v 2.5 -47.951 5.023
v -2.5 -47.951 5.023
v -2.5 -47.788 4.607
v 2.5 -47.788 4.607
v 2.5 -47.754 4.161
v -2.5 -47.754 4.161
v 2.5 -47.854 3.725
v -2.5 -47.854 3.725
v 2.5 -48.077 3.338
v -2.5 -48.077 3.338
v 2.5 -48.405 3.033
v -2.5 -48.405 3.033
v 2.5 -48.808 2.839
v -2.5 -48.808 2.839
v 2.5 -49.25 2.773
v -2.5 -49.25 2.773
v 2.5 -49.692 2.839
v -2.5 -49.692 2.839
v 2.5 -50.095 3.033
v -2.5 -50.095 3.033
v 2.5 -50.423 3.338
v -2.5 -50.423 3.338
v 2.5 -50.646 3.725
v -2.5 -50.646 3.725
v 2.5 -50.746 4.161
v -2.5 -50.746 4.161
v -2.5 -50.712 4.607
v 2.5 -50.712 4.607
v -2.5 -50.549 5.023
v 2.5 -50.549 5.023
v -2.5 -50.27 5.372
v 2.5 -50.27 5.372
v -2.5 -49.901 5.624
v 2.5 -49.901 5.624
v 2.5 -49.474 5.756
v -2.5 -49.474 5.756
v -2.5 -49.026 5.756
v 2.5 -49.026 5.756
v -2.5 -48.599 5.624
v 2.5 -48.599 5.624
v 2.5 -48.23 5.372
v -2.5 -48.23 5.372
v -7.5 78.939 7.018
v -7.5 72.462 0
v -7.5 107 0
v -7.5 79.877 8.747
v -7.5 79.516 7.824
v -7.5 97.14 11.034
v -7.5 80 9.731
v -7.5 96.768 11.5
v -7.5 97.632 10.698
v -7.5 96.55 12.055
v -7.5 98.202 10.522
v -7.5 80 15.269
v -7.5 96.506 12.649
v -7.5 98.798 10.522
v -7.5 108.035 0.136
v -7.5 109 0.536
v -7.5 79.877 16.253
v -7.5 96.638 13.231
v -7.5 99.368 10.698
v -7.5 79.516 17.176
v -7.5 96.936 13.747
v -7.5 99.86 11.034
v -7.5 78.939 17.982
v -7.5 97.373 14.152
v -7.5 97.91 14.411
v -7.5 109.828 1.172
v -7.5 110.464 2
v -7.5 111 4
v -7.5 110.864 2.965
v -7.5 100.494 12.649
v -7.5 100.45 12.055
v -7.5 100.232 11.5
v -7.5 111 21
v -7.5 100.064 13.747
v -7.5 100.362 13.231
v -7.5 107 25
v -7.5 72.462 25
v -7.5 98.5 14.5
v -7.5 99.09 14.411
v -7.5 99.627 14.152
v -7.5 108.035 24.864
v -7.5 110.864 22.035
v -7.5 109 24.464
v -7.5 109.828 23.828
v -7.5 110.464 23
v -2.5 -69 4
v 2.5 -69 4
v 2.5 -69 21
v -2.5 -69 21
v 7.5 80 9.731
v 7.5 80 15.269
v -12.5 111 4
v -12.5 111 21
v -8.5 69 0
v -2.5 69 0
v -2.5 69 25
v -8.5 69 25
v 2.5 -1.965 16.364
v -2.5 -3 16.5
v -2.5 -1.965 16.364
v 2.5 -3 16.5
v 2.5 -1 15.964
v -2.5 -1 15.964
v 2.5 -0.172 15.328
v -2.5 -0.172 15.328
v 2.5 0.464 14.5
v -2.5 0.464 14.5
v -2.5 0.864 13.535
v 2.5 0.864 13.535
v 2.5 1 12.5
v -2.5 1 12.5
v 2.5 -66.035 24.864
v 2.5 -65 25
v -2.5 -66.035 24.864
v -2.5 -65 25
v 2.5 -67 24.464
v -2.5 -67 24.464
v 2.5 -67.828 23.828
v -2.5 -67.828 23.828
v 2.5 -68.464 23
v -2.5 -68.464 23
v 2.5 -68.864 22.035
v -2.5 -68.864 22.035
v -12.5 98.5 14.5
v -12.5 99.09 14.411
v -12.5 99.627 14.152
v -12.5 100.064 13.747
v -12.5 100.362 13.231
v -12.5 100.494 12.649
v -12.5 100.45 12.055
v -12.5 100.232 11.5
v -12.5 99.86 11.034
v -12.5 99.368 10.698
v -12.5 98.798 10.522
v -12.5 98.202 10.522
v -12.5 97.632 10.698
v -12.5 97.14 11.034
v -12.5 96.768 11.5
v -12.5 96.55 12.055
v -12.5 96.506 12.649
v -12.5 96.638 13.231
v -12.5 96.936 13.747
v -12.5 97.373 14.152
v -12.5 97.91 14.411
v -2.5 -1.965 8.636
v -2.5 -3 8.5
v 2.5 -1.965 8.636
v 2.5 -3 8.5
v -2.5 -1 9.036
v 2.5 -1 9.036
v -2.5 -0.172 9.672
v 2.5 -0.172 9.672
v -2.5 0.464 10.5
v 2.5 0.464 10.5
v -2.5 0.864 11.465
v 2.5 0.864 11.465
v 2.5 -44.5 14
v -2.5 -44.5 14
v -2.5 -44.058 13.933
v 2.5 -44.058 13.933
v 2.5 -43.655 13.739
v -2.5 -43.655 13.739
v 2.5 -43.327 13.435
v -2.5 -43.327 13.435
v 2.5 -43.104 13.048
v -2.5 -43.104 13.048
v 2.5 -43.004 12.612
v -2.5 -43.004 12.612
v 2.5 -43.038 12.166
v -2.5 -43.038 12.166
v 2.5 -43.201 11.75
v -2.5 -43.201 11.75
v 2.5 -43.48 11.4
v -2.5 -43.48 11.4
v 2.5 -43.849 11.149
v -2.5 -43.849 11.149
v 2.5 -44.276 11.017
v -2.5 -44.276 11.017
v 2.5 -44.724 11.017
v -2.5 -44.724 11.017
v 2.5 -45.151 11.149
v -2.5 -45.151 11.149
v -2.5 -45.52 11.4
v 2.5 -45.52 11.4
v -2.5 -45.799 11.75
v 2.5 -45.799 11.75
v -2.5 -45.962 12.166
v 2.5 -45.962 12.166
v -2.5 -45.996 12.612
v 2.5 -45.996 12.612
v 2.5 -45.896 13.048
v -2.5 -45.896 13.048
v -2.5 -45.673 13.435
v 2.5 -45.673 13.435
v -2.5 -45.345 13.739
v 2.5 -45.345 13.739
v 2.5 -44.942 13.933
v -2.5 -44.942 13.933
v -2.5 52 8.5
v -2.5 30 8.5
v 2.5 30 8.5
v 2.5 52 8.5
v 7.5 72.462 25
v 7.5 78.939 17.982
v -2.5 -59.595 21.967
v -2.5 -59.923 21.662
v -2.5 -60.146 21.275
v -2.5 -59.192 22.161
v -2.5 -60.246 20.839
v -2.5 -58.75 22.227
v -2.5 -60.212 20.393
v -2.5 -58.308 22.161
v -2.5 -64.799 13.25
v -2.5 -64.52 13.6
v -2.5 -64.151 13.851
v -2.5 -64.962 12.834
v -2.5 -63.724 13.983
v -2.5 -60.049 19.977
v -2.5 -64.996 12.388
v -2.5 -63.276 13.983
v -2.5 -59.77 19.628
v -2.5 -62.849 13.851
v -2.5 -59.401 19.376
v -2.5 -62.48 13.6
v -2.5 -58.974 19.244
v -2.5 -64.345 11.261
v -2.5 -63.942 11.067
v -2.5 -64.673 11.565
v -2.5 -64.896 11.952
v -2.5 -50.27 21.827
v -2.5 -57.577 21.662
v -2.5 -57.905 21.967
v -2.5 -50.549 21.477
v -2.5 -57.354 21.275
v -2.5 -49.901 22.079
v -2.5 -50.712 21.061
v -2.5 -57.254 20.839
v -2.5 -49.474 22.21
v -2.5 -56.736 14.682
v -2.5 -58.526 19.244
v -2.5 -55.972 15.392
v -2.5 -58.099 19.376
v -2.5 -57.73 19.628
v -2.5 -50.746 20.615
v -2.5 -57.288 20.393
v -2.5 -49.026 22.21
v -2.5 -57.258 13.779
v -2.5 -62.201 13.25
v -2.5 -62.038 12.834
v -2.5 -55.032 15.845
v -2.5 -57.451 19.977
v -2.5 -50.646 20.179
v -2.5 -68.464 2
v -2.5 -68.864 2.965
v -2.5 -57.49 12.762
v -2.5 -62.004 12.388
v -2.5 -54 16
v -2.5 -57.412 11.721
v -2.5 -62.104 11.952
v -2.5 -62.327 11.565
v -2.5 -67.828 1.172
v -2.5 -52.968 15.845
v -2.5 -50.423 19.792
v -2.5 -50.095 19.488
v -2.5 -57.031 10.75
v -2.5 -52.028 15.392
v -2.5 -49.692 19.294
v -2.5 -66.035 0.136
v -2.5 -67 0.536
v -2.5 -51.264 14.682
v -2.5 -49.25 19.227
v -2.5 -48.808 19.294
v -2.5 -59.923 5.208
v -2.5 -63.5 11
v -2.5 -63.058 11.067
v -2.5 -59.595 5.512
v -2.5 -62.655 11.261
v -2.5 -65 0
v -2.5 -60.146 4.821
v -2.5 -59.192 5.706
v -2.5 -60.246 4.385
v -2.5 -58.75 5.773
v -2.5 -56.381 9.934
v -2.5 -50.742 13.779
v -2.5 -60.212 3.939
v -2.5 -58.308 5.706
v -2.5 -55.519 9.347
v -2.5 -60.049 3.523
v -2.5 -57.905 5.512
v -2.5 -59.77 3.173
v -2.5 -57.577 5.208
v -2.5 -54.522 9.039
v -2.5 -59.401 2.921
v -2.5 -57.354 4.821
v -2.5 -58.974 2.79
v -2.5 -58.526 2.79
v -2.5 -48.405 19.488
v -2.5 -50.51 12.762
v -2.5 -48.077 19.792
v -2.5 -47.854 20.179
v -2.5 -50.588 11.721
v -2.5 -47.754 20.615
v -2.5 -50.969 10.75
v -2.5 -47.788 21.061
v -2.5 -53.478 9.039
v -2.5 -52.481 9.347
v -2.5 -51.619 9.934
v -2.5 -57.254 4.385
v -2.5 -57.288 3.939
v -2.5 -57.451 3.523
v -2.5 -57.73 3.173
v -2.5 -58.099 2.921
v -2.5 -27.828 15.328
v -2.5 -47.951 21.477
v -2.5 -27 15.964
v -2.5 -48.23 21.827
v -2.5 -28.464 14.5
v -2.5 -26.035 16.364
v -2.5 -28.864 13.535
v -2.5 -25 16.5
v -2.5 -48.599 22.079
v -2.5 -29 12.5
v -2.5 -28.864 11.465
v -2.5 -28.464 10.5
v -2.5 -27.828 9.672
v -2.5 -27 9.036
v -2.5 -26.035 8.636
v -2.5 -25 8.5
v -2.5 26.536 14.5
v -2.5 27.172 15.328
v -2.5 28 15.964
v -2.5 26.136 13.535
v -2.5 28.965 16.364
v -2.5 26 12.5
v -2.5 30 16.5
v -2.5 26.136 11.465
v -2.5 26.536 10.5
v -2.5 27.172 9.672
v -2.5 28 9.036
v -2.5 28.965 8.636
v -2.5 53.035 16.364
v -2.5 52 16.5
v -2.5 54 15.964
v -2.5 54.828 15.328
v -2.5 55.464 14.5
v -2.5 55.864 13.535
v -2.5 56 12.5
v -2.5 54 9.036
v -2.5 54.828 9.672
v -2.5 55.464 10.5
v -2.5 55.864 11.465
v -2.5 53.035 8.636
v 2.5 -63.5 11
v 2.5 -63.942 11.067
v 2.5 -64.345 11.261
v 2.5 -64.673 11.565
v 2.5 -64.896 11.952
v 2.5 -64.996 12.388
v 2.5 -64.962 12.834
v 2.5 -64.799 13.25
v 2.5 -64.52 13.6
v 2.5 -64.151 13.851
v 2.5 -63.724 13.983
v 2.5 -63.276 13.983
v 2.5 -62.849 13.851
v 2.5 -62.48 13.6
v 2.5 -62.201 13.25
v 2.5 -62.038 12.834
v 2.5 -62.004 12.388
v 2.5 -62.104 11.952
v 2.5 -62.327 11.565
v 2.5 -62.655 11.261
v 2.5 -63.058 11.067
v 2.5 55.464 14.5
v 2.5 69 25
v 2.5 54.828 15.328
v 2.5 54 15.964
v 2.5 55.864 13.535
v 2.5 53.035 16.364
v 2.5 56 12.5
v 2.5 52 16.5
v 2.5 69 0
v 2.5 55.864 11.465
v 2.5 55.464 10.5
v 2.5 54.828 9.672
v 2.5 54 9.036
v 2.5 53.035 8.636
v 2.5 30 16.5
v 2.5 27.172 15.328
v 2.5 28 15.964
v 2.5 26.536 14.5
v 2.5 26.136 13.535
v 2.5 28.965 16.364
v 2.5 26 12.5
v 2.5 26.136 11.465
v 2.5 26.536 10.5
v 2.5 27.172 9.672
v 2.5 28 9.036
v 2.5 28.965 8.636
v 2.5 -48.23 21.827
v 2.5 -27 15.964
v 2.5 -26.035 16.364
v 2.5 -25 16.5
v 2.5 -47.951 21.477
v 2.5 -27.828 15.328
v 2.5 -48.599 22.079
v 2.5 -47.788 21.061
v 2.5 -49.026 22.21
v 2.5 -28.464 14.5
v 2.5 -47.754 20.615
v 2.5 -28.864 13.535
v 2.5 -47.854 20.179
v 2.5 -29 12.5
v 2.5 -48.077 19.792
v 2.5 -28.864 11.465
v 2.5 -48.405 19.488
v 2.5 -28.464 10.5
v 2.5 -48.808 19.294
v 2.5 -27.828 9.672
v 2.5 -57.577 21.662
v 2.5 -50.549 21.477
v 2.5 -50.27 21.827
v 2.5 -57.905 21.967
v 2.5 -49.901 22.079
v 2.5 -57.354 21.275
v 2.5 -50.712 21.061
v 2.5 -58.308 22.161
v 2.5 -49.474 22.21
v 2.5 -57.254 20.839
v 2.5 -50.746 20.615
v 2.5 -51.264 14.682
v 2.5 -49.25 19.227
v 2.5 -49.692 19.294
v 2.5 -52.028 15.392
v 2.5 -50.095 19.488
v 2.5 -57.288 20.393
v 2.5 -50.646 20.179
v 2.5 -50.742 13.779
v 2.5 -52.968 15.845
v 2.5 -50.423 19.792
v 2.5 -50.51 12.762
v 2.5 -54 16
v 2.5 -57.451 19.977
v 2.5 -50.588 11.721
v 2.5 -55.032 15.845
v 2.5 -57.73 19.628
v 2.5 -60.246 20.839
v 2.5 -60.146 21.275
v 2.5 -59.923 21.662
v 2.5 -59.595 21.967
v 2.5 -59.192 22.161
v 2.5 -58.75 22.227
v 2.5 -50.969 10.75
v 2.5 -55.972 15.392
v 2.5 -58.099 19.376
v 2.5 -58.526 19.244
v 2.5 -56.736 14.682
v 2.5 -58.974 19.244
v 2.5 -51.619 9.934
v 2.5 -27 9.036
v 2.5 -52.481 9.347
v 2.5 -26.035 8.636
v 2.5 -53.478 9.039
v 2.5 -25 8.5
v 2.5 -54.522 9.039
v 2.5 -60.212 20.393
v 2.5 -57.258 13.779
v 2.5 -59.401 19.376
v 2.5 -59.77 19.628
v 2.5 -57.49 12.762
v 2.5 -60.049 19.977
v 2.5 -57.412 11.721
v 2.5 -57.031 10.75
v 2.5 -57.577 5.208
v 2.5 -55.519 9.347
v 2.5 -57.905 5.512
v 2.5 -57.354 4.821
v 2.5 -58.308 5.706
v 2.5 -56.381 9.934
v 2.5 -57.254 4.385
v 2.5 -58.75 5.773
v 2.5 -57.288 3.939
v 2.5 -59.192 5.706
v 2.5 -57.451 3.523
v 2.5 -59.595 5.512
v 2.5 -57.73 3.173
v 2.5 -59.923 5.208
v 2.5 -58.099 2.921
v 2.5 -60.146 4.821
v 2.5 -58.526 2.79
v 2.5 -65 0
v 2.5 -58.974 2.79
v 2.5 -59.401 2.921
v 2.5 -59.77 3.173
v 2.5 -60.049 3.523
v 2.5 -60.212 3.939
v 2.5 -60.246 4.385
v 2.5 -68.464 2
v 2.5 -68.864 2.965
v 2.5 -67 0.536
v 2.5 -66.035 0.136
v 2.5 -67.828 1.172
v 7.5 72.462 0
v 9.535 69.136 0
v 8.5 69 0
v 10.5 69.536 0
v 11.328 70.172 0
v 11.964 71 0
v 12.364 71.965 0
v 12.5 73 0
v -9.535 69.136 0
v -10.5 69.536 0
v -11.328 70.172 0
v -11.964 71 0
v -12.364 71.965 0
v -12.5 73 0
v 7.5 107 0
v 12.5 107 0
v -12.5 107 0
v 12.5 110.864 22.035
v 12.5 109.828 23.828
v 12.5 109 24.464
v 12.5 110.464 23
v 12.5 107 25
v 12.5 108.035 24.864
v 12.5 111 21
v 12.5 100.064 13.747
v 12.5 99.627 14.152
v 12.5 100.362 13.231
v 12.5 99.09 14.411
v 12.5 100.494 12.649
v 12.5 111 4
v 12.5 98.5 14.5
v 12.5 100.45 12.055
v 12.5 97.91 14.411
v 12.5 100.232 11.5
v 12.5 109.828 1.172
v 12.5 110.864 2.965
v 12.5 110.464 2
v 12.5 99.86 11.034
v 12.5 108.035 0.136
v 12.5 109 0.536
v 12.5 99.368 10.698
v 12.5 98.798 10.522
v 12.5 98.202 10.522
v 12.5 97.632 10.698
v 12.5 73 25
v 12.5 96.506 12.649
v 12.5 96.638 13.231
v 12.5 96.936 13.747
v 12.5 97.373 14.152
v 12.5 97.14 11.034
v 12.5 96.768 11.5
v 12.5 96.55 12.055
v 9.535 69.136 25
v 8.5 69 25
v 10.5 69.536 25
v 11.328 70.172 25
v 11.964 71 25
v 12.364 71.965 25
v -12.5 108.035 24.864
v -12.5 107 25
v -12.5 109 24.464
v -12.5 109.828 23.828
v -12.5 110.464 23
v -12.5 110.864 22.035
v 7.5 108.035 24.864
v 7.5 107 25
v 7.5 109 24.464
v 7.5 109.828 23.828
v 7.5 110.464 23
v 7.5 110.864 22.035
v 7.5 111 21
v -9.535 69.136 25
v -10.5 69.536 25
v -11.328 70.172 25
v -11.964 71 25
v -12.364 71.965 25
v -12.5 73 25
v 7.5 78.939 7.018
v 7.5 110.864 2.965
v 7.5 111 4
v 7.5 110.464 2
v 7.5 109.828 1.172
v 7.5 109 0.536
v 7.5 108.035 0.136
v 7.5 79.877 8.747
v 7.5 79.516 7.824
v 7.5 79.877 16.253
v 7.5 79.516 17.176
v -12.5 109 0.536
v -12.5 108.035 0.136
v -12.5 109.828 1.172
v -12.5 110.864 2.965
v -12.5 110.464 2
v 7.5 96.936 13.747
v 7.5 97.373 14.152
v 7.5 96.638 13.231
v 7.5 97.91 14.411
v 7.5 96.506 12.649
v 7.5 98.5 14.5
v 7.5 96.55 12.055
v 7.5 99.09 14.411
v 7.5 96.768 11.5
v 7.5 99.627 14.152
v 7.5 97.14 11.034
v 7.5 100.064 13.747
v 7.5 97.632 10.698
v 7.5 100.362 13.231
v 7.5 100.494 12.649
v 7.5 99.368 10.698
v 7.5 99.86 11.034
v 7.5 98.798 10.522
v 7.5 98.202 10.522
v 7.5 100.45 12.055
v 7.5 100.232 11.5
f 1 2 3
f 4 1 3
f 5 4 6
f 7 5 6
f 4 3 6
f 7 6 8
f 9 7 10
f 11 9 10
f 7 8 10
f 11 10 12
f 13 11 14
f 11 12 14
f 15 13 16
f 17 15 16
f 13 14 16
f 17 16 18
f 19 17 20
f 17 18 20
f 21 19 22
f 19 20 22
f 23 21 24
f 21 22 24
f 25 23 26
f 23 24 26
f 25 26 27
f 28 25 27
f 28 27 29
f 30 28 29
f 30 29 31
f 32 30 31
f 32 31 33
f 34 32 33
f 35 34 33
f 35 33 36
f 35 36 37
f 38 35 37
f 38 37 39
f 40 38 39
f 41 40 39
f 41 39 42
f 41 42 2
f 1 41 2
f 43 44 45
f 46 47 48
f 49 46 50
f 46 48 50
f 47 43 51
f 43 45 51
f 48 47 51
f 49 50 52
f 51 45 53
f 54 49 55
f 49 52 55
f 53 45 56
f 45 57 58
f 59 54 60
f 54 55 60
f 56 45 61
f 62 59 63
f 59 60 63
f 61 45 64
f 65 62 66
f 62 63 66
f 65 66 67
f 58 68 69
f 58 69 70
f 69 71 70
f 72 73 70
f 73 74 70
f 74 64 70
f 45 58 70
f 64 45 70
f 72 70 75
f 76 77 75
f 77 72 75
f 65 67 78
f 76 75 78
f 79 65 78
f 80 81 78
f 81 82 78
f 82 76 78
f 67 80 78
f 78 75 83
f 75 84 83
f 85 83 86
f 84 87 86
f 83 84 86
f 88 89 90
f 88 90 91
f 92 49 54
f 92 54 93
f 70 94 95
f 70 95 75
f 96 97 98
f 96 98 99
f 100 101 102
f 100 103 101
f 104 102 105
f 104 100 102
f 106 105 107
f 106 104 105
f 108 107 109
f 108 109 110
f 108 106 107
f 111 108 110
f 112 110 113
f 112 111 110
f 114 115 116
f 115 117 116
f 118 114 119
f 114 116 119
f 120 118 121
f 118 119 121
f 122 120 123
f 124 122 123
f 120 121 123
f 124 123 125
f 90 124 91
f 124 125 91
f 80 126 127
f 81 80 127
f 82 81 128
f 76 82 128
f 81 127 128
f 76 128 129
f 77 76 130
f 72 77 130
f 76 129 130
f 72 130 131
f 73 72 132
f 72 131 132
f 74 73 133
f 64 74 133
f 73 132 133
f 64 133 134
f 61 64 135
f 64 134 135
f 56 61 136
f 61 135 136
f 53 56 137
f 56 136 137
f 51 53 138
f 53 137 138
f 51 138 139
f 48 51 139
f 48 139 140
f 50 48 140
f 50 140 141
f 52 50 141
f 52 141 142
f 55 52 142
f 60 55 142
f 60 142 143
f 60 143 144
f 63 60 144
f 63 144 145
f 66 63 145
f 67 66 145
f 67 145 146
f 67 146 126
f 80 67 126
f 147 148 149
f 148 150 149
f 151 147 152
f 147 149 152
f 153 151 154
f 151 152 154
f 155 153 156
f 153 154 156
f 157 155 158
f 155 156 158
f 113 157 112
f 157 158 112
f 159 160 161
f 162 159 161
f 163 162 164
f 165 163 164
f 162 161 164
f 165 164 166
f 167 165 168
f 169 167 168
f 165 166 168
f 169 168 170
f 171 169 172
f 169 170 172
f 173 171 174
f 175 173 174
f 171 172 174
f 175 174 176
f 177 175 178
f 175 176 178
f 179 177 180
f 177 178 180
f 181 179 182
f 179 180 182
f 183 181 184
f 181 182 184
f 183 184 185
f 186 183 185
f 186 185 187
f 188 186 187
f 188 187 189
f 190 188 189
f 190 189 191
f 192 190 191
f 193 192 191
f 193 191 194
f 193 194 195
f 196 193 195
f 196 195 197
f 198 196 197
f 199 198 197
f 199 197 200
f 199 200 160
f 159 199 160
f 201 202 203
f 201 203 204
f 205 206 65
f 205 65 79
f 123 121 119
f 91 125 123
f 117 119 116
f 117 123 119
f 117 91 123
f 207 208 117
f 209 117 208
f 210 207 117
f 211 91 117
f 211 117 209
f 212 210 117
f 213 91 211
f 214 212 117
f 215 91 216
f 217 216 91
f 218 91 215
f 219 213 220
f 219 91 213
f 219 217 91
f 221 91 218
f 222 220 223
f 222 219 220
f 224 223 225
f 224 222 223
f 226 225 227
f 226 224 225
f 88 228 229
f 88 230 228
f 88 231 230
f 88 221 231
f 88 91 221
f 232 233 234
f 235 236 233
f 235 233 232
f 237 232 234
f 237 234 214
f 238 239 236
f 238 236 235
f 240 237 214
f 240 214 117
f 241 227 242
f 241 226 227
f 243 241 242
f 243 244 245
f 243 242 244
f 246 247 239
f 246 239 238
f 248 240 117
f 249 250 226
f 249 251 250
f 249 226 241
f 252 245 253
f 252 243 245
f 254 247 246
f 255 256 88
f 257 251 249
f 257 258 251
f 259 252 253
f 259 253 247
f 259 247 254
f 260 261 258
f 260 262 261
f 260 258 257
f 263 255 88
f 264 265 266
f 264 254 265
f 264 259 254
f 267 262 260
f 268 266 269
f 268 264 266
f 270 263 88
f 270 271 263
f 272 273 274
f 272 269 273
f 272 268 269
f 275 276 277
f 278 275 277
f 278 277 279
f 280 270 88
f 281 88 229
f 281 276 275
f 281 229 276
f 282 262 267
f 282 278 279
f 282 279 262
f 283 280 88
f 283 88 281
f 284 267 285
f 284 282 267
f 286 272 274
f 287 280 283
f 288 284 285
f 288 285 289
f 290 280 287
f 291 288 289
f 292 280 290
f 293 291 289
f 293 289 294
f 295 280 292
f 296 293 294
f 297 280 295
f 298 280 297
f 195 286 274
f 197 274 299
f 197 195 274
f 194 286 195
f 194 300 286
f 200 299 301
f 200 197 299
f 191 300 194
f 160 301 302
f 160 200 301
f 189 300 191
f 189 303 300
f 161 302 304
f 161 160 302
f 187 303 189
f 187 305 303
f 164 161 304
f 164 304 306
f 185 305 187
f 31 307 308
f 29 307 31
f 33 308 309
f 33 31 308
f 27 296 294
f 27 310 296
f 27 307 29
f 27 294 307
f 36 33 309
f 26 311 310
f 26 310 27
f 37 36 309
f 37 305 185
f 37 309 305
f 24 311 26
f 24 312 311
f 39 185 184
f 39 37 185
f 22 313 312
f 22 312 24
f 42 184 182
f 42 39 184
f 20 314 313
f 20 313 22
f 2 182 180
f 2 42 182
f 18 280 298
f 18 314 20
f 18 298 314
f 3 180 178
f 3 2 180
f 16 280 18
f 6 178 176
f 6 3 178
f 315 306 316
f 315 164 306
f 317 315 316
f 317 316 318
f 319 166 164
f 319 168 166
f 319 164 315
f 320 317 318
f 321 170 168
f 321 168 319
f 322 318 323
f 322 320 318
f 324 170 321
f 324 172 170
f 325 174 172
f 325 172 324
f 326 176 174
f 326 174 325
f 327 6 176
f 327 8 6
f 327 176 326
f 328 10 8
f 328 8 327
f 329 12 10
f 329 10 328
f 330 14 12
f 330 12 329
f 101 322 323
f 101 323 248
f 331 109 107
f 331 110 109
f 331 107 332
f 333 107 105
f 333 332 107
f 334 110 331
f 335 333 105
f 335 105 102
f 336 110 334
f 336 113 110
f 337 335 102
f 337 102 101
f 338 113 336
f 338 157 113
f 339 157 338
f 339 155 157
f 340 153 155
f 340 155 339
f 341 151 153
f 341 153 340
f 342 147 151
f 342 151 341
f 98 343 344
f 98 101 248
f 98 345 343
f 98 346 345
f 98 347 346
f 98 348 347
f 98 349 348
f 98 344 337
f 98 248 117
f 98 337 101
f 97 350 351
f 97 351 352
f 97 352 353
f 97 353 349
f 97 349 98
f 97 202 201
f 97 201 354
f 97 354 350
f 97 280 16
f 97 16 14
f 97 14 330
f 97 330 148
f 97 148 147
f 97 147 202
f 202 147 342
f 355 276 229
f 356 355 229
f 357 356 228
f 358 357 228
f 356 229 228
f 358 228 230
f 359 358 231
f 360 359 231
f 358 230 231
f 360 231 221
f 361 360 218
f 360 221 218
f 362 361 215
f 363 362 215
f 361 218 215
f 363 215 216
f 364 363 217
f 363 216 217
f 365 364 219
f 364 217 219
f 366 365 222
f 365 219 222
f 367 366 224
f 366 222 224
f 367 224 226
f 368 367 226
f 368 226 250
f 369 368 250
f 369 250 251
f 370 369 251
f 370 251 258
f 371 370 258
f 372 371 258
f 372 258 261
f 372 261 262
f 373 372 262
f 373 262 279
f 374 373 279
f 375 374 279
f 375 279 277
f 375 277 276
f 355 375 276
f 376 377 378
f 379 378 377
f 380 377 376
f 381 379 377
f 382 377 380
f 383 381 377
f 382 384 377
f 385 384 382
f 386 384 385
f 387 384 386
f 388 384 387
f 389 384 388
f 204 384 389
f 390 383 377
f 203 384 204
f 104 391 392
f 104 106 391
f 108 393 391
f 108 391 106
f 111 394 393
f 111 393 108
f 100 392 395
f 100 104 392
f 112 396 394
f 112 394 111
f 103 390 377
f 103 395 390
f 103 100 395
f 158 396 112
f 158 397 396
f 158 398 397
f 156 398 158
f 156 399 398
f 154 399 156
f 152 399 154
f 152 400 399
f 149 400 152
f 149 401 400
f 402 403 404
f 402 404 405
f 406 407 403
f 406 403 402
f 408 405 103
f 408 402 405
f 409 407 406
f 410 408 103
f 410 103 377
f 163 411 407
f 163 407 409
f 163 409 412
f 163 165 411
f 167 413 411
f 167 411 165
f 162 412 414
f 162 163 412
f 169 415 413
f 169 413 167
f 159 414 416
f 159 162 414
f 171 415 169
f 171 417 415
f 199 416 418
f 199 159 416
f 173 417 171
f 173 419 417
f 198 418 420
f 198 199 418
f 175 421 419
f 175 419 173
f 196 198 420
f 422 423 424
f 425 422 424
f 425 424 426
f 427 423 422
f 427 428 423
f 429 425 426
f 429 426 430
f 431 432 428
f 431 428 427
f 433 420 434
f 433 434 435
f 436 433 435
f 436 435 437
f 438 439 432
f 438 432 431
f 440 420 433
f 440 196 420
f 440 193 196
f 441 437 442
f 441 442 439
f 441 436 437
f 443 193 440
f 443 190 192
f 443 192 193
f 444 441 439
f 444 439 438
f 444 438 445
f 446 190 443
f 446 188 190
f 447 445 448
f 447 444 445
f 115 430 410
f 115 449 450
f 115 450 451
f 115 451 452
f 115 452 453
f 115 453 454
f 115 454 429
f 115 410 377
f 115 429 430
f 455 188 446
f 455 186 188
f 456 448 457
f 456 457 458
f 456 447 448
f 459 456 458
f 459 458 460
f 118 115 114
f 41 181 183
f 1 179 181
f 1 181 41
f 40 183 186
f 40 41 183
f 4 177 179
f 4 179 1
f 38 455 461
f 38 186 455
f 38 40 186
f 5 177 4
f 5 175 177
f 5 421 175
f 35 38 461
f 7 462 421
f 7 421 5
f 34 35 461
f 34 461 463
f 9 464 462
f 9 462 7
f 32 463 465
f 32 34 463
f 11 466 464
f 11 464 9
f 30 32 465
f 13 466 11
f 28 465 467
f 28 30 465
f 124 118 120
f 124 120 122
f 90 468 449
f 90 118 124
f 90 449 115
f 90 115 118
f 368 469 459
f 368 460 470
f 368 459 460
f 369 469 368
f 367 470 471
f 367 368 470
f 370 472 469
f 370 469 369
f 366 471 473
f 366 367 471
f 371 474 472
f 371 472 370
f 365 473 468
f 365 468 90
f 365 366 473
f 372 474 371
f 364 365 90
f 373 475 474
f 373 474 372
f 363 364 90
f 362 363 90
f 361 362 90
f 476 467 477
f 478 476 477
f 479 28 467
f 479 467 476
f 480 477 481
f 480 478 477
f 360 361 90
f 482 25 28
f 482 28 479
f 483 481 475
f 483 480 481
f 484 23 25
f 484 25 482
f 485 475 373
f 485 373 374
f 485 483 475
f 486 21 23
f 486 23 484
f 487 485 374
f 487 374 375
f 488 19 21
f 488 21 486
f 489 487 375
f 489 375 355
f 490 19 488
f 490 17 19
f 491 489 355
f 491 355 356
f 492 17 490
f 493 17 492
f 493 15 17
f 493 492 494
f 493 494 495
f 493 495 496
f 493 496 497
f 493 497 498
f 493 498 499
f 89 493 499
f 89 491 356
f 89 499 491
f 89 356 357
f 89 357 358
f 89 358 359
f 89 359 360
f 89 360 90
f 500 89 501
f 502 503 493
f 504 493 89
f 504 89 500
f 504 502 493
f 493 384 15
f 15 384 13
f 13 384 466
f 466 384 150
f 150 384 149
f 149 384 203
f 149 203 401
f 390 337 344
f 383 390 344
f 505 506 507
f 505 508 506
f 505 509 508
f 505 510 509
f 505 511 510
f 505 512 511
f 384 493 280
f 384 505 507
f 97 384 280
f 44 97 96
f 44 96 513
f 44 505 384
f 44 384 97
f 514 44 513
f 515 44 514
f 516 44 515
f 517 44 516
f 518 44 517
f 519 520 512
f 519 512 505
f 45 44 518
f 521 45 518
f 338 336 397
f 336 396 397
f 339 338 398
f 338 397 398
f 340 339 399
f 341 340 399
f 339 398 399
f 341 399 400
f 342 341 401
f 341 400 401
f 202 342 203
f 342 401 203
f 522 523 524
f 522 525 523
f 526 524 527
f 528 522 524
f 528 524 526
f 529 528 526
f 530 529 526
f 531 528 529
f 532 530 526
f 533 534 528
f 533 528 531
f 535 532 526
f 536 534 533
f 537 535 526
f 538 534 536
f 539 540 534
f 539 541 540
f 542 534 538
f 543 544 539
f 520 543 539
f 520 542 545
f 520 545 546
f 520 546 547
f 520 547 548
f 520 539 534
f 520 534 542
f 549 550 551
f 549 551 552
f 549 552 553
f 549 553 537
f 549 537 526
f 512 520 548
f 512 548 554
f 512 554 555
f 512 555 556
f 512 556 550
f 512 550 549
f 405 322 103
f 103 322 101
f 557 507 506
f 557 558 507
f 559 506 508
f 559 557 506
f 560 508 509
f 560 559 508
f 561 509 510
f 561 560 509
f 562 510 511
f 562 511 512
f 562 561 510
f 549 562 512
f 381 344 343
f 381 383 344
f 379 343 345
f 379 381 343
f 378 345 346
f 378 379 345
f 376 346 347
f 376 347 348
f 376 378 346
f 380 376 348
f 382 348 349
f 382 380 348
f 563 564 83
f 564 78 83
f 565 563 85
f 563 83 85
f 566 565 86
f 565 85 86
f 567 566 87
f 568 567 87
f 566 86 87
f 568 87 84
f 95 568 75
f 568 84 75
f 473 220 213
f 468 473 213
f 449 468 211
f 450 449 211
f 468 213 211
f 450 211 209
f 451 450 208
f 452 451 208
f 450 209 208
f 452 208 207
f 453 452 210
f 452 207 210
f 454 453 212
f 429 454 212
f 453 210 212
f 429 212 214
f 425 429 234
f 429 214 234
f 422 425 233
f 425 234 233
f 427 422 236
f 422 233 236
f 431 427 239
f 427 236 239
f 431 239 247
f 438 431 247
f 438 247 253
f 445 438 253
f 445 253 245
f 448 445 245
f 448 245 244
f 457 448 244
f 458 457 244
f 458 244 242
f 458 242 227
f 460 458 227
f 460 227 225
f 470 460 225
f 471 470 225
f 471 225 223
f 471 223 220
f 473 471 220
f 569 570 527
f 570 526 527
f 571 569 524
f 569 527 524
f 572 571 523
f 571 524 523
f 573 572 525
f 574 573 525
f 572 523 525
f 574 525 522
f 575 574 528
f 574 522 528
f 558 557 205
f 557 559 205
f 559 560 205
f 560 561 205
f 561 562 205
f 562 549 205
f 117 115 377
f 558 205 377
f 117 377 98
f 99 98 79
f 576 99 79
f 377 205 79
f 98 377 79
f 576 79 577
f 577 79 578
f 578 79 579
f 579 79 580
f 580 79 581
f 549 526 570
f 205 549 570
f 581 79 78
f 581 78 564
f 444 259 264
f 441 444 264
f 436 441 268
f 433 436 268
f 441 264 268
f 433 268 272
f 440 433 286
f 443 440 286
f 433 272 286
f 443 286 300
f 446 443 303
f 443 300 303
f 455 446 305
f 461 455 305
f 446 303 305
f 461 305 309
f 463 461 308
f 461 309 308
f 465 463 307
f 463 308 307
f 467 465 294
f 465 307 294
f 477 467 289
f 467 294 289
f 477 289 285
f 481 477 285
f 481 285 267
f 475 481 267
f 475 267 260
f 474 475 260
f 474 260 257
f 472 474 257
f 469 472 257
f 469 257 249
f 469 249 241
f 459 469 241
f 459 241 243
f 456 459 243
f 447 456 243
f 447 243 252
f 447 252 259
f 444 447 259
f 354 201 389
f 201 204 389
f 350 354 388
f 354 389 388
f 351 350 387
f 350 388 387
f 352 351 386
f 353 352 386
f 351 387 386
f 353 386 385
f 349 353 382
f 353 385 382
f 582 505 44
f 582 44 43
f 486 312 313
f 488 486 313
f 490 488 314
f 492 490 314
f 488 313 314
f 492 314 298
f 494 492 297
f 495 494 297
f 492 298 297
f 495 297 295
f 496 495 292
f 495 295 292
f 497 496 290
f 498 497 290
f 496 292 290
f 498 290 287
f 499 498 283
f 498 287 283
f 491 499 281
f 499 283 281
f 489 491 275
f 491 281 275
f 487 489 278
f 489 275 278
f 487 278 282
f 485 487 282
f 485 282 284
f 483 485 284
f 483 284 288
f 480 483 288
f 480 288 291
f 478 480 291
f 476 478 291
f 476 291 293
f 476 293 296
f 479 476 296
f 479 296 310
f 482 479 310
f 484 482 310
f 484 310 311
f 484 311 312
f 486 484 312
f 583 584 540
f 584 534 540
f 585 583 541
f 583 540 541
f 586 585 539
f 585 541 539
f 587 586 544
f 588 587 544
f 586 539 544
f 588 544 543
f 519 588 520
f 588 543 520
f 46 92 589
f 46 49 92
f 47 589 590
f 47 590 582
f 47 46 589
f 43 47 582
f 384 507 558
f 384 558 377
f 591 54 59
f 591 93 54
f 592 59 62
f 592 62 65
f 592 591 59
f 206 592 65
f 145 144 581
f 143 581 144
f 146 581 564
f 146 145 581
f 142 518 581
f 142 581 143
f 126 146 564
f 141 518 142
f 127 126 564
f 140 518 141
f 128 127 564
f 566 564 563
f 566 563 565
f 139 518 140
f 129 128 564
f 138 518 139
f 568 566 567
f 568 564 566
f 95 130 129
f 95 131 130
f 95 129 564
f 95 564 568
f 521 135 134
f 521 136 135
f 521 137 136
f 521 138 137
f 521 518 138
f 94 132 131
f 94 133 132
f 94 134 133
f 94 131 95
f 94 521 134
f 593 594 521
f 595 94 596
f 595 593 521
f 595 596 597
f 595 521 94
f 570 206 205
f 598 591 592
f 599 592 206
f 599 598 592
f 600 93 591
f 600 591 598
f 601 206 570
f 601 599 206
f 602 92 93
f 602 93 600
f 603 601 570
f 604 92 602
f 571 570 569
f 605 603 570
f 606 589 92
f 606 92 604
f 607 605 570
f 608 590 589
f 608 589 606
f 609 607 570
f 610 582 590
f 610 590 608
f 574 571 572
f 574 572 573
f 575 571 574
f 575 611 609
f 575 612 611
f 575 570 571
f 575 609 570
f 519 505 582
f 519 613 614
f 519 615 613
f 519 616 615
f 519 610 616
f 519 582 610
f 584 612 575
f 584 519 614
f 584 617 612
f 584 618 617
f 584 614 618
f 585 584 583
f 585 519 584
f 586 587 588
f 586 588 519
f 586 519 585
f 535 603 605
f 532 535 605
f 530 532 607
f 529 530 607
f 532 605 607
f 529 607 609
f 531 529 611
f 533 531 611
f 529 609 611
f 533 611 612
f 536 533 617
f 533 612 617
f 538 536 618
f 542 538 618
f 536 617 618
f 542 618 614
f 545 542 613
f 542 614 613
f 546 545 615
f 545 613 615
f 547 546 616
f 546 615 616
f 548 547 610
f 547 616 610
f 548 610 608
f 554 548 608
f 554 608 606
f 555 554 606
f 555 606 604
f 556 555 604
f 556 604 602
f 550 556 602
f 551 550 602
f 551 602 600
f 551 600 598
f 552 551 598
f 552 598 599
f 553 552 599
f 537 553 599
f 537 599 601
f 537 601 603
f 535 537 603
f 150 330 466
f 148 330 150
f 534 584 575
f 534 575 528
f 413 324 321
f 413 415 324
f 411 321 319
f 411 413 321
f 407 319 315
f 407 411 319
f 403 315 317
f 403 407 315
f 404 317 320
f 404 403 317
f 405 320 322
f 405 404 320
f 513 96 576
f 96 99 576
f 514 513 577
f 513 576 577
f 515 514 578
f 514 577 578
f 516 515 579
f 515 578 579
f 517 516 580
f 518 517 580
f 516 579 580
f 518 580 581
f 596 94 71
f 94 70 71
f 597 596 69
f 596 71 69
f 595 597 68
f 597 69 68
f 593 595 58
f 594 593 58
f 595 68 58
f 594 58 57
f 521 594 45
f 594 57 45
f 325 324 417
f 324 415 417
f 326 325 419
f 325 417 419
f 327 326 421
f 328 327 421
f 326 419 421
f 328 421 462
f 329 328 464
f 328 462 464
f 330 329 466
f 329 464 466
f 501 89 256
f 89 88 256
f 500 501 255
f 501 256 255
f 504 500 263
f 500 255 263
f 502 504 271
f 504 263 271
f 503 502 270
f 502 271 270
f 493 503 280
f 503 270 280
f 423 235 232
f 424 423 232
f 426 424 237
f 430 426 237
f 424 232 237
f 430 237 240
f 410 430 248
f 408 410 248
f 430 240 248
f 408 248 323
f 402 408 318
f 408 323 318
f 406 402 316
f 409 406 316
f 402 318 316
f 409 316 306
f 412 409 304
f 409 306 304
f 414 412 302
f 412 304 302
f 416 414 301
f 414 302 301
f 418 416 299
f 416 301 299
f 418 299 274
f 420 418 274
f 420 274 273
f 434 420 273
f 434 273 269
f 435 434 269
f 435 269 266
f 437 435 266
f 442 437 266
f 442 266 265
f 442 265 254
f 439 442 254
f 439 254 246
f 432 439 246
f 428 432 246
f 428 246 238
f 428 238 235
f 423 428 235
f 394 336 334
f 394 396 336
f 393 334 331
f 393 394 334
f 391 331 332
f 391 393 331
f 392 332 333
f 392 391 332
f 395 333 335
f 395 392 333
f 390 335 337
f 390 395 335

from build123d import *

# Parameters (mm, degrees)
Y_KSEKLIK_EKSTR_ZYON1_DEPTH = 25
IZIM2_R                     = 2
KES_EKSTR_ZYON1_DEPTH       = 25
IZIM3_R                     = 3.5
IZIM3_W                     = 8
IZIM3_H                     = 30
KES_EKSTR_ZYON2_DEPTH       = 10
IZIM4_R                     = 1.5
KES_EKSTR_ZYON3_DEPTH       = 10
DAIRESEL_KAPLAMA2_COUNT     = 6
CUT_EXTRUDE8_DEPTH          = 7.5
RADYUS1_R                   = 4


with BuildPart() as part:
    # Çizim1 → Yükseklik-Ekstrüzyon1 (new body)
    with BuildSketch(Plane.XY):
        Polygon((-2.5, 69), (-12.5, 69), (-12.5, 111), (-7.5, 111), (-7.5, 80), (7.5, 80), (7.5, 111), (12.5, 111), (12.5, 69), (2.5, 69), (2.5, -69), (-2.5, -69), align=None)
    extrude(amount=Y_KSEKLIK_EKSTR_ZYON1_DEPTH)

    # Çizim2 → Kes-Ekstrüzyon1 (cut)
    with BuildSketch(Plane.ZY.offset(12.5)):
        with Locations((12.5, 98.5)):
            Circle(IZIM2_R)
    extrude(amount=-KES_EKSTR_ZYON1_DEPTH, mode=Mode.SUBTRACT)

    # Çizim3 → Kes-Ekstrüzyon2 (cut)
    with BuildSketch(Plane.ZY.offset(2.5)):
        with Locations((12.5, -54)):
            Circle(IZIM3_R)
        with Locations((12.5, 41)):
            Rectangle(IZIM3_W, IZIM3_H)
        with Locations((12.5, -14)):
            Rectangle(IZIM3_W, IZIM3_H)
    extrude(amount=-KES_EKSTR_ZYON2_DEPTH, mode=Mode.SUBTRACT)

    # Çizim4 → Kes-Ekstrüzyon3 (cut)
    with BuildSketch(Plane.ZY.offset(2.5)):
        with Locations((12.5, -44.5)):
            Circle(IZIM4_R)
    kes_ekstr_zyon3 = extrude(amount=-KES_EKSTR_ZYON3_DEPTH, mode=Mode.SUBTRACT)

    # Dairesel Kaplama2: Kes-Ekstrüzyon3 ×6 about axis
    dairesel_kaplama2_axis = Axis((0, -54, 12.5), (1, 0, 0))
    for i in range(1, DAIRESEL_KAPLAMA2_COUNT):
        add(kes_ekstr_zyon3.rotate(dairesel_kaplama2_axis, i * 360 / DAIRESEL_KAPLAMA2_COUNT), mode=Mode.SUBTRACT)

    # Sketch2 → Cut-Extrude8 (cut, symmetric)
    with BuildSketch(Plane(origin=(0, 0, 0), x_dir=(0, 0, -1), z_dir=(1, 0, 0))):
        Polygon((-12.5, 84), (-25.5, 72), (-25.5, 86), (0.5, 86), (0.5, 72), align=None)
    extrude(amount=CUT_EXTRUDE8_DEPTH, both=True, mode=Mode.SUBTRACT)

    # Radyus1
    radyus1_edges = [part.edges().sort_by_distance(p)[0] for p in [
        (-10, 111, 25),
        (10, 111, 25),
        (10, 111, 0),
        (-10, 111, 0),
        (0, 26, 16.5),
        (0, 56, 16.5),
        (0, 26, 8.5),
        (0, 56, 8.5),
        (0, -29, 16.5),
        (0, -29, 8.5),
        (0, 1, 16.5),
        (0, 1, 8.5),
        (0, -69, 25),
        (0, -69, 0),
        (0, 80, 16.833333333),
        (0, 80, 8.166666667),
        (12.5, 69, 12.5),
        (-12.5, 69, 12.5),
    ]]
    fillet(radyus1_edges, radius=RADYUS1_R - 0.0001)  # a hair under: the kernel refuses the full size


solid = part.part
